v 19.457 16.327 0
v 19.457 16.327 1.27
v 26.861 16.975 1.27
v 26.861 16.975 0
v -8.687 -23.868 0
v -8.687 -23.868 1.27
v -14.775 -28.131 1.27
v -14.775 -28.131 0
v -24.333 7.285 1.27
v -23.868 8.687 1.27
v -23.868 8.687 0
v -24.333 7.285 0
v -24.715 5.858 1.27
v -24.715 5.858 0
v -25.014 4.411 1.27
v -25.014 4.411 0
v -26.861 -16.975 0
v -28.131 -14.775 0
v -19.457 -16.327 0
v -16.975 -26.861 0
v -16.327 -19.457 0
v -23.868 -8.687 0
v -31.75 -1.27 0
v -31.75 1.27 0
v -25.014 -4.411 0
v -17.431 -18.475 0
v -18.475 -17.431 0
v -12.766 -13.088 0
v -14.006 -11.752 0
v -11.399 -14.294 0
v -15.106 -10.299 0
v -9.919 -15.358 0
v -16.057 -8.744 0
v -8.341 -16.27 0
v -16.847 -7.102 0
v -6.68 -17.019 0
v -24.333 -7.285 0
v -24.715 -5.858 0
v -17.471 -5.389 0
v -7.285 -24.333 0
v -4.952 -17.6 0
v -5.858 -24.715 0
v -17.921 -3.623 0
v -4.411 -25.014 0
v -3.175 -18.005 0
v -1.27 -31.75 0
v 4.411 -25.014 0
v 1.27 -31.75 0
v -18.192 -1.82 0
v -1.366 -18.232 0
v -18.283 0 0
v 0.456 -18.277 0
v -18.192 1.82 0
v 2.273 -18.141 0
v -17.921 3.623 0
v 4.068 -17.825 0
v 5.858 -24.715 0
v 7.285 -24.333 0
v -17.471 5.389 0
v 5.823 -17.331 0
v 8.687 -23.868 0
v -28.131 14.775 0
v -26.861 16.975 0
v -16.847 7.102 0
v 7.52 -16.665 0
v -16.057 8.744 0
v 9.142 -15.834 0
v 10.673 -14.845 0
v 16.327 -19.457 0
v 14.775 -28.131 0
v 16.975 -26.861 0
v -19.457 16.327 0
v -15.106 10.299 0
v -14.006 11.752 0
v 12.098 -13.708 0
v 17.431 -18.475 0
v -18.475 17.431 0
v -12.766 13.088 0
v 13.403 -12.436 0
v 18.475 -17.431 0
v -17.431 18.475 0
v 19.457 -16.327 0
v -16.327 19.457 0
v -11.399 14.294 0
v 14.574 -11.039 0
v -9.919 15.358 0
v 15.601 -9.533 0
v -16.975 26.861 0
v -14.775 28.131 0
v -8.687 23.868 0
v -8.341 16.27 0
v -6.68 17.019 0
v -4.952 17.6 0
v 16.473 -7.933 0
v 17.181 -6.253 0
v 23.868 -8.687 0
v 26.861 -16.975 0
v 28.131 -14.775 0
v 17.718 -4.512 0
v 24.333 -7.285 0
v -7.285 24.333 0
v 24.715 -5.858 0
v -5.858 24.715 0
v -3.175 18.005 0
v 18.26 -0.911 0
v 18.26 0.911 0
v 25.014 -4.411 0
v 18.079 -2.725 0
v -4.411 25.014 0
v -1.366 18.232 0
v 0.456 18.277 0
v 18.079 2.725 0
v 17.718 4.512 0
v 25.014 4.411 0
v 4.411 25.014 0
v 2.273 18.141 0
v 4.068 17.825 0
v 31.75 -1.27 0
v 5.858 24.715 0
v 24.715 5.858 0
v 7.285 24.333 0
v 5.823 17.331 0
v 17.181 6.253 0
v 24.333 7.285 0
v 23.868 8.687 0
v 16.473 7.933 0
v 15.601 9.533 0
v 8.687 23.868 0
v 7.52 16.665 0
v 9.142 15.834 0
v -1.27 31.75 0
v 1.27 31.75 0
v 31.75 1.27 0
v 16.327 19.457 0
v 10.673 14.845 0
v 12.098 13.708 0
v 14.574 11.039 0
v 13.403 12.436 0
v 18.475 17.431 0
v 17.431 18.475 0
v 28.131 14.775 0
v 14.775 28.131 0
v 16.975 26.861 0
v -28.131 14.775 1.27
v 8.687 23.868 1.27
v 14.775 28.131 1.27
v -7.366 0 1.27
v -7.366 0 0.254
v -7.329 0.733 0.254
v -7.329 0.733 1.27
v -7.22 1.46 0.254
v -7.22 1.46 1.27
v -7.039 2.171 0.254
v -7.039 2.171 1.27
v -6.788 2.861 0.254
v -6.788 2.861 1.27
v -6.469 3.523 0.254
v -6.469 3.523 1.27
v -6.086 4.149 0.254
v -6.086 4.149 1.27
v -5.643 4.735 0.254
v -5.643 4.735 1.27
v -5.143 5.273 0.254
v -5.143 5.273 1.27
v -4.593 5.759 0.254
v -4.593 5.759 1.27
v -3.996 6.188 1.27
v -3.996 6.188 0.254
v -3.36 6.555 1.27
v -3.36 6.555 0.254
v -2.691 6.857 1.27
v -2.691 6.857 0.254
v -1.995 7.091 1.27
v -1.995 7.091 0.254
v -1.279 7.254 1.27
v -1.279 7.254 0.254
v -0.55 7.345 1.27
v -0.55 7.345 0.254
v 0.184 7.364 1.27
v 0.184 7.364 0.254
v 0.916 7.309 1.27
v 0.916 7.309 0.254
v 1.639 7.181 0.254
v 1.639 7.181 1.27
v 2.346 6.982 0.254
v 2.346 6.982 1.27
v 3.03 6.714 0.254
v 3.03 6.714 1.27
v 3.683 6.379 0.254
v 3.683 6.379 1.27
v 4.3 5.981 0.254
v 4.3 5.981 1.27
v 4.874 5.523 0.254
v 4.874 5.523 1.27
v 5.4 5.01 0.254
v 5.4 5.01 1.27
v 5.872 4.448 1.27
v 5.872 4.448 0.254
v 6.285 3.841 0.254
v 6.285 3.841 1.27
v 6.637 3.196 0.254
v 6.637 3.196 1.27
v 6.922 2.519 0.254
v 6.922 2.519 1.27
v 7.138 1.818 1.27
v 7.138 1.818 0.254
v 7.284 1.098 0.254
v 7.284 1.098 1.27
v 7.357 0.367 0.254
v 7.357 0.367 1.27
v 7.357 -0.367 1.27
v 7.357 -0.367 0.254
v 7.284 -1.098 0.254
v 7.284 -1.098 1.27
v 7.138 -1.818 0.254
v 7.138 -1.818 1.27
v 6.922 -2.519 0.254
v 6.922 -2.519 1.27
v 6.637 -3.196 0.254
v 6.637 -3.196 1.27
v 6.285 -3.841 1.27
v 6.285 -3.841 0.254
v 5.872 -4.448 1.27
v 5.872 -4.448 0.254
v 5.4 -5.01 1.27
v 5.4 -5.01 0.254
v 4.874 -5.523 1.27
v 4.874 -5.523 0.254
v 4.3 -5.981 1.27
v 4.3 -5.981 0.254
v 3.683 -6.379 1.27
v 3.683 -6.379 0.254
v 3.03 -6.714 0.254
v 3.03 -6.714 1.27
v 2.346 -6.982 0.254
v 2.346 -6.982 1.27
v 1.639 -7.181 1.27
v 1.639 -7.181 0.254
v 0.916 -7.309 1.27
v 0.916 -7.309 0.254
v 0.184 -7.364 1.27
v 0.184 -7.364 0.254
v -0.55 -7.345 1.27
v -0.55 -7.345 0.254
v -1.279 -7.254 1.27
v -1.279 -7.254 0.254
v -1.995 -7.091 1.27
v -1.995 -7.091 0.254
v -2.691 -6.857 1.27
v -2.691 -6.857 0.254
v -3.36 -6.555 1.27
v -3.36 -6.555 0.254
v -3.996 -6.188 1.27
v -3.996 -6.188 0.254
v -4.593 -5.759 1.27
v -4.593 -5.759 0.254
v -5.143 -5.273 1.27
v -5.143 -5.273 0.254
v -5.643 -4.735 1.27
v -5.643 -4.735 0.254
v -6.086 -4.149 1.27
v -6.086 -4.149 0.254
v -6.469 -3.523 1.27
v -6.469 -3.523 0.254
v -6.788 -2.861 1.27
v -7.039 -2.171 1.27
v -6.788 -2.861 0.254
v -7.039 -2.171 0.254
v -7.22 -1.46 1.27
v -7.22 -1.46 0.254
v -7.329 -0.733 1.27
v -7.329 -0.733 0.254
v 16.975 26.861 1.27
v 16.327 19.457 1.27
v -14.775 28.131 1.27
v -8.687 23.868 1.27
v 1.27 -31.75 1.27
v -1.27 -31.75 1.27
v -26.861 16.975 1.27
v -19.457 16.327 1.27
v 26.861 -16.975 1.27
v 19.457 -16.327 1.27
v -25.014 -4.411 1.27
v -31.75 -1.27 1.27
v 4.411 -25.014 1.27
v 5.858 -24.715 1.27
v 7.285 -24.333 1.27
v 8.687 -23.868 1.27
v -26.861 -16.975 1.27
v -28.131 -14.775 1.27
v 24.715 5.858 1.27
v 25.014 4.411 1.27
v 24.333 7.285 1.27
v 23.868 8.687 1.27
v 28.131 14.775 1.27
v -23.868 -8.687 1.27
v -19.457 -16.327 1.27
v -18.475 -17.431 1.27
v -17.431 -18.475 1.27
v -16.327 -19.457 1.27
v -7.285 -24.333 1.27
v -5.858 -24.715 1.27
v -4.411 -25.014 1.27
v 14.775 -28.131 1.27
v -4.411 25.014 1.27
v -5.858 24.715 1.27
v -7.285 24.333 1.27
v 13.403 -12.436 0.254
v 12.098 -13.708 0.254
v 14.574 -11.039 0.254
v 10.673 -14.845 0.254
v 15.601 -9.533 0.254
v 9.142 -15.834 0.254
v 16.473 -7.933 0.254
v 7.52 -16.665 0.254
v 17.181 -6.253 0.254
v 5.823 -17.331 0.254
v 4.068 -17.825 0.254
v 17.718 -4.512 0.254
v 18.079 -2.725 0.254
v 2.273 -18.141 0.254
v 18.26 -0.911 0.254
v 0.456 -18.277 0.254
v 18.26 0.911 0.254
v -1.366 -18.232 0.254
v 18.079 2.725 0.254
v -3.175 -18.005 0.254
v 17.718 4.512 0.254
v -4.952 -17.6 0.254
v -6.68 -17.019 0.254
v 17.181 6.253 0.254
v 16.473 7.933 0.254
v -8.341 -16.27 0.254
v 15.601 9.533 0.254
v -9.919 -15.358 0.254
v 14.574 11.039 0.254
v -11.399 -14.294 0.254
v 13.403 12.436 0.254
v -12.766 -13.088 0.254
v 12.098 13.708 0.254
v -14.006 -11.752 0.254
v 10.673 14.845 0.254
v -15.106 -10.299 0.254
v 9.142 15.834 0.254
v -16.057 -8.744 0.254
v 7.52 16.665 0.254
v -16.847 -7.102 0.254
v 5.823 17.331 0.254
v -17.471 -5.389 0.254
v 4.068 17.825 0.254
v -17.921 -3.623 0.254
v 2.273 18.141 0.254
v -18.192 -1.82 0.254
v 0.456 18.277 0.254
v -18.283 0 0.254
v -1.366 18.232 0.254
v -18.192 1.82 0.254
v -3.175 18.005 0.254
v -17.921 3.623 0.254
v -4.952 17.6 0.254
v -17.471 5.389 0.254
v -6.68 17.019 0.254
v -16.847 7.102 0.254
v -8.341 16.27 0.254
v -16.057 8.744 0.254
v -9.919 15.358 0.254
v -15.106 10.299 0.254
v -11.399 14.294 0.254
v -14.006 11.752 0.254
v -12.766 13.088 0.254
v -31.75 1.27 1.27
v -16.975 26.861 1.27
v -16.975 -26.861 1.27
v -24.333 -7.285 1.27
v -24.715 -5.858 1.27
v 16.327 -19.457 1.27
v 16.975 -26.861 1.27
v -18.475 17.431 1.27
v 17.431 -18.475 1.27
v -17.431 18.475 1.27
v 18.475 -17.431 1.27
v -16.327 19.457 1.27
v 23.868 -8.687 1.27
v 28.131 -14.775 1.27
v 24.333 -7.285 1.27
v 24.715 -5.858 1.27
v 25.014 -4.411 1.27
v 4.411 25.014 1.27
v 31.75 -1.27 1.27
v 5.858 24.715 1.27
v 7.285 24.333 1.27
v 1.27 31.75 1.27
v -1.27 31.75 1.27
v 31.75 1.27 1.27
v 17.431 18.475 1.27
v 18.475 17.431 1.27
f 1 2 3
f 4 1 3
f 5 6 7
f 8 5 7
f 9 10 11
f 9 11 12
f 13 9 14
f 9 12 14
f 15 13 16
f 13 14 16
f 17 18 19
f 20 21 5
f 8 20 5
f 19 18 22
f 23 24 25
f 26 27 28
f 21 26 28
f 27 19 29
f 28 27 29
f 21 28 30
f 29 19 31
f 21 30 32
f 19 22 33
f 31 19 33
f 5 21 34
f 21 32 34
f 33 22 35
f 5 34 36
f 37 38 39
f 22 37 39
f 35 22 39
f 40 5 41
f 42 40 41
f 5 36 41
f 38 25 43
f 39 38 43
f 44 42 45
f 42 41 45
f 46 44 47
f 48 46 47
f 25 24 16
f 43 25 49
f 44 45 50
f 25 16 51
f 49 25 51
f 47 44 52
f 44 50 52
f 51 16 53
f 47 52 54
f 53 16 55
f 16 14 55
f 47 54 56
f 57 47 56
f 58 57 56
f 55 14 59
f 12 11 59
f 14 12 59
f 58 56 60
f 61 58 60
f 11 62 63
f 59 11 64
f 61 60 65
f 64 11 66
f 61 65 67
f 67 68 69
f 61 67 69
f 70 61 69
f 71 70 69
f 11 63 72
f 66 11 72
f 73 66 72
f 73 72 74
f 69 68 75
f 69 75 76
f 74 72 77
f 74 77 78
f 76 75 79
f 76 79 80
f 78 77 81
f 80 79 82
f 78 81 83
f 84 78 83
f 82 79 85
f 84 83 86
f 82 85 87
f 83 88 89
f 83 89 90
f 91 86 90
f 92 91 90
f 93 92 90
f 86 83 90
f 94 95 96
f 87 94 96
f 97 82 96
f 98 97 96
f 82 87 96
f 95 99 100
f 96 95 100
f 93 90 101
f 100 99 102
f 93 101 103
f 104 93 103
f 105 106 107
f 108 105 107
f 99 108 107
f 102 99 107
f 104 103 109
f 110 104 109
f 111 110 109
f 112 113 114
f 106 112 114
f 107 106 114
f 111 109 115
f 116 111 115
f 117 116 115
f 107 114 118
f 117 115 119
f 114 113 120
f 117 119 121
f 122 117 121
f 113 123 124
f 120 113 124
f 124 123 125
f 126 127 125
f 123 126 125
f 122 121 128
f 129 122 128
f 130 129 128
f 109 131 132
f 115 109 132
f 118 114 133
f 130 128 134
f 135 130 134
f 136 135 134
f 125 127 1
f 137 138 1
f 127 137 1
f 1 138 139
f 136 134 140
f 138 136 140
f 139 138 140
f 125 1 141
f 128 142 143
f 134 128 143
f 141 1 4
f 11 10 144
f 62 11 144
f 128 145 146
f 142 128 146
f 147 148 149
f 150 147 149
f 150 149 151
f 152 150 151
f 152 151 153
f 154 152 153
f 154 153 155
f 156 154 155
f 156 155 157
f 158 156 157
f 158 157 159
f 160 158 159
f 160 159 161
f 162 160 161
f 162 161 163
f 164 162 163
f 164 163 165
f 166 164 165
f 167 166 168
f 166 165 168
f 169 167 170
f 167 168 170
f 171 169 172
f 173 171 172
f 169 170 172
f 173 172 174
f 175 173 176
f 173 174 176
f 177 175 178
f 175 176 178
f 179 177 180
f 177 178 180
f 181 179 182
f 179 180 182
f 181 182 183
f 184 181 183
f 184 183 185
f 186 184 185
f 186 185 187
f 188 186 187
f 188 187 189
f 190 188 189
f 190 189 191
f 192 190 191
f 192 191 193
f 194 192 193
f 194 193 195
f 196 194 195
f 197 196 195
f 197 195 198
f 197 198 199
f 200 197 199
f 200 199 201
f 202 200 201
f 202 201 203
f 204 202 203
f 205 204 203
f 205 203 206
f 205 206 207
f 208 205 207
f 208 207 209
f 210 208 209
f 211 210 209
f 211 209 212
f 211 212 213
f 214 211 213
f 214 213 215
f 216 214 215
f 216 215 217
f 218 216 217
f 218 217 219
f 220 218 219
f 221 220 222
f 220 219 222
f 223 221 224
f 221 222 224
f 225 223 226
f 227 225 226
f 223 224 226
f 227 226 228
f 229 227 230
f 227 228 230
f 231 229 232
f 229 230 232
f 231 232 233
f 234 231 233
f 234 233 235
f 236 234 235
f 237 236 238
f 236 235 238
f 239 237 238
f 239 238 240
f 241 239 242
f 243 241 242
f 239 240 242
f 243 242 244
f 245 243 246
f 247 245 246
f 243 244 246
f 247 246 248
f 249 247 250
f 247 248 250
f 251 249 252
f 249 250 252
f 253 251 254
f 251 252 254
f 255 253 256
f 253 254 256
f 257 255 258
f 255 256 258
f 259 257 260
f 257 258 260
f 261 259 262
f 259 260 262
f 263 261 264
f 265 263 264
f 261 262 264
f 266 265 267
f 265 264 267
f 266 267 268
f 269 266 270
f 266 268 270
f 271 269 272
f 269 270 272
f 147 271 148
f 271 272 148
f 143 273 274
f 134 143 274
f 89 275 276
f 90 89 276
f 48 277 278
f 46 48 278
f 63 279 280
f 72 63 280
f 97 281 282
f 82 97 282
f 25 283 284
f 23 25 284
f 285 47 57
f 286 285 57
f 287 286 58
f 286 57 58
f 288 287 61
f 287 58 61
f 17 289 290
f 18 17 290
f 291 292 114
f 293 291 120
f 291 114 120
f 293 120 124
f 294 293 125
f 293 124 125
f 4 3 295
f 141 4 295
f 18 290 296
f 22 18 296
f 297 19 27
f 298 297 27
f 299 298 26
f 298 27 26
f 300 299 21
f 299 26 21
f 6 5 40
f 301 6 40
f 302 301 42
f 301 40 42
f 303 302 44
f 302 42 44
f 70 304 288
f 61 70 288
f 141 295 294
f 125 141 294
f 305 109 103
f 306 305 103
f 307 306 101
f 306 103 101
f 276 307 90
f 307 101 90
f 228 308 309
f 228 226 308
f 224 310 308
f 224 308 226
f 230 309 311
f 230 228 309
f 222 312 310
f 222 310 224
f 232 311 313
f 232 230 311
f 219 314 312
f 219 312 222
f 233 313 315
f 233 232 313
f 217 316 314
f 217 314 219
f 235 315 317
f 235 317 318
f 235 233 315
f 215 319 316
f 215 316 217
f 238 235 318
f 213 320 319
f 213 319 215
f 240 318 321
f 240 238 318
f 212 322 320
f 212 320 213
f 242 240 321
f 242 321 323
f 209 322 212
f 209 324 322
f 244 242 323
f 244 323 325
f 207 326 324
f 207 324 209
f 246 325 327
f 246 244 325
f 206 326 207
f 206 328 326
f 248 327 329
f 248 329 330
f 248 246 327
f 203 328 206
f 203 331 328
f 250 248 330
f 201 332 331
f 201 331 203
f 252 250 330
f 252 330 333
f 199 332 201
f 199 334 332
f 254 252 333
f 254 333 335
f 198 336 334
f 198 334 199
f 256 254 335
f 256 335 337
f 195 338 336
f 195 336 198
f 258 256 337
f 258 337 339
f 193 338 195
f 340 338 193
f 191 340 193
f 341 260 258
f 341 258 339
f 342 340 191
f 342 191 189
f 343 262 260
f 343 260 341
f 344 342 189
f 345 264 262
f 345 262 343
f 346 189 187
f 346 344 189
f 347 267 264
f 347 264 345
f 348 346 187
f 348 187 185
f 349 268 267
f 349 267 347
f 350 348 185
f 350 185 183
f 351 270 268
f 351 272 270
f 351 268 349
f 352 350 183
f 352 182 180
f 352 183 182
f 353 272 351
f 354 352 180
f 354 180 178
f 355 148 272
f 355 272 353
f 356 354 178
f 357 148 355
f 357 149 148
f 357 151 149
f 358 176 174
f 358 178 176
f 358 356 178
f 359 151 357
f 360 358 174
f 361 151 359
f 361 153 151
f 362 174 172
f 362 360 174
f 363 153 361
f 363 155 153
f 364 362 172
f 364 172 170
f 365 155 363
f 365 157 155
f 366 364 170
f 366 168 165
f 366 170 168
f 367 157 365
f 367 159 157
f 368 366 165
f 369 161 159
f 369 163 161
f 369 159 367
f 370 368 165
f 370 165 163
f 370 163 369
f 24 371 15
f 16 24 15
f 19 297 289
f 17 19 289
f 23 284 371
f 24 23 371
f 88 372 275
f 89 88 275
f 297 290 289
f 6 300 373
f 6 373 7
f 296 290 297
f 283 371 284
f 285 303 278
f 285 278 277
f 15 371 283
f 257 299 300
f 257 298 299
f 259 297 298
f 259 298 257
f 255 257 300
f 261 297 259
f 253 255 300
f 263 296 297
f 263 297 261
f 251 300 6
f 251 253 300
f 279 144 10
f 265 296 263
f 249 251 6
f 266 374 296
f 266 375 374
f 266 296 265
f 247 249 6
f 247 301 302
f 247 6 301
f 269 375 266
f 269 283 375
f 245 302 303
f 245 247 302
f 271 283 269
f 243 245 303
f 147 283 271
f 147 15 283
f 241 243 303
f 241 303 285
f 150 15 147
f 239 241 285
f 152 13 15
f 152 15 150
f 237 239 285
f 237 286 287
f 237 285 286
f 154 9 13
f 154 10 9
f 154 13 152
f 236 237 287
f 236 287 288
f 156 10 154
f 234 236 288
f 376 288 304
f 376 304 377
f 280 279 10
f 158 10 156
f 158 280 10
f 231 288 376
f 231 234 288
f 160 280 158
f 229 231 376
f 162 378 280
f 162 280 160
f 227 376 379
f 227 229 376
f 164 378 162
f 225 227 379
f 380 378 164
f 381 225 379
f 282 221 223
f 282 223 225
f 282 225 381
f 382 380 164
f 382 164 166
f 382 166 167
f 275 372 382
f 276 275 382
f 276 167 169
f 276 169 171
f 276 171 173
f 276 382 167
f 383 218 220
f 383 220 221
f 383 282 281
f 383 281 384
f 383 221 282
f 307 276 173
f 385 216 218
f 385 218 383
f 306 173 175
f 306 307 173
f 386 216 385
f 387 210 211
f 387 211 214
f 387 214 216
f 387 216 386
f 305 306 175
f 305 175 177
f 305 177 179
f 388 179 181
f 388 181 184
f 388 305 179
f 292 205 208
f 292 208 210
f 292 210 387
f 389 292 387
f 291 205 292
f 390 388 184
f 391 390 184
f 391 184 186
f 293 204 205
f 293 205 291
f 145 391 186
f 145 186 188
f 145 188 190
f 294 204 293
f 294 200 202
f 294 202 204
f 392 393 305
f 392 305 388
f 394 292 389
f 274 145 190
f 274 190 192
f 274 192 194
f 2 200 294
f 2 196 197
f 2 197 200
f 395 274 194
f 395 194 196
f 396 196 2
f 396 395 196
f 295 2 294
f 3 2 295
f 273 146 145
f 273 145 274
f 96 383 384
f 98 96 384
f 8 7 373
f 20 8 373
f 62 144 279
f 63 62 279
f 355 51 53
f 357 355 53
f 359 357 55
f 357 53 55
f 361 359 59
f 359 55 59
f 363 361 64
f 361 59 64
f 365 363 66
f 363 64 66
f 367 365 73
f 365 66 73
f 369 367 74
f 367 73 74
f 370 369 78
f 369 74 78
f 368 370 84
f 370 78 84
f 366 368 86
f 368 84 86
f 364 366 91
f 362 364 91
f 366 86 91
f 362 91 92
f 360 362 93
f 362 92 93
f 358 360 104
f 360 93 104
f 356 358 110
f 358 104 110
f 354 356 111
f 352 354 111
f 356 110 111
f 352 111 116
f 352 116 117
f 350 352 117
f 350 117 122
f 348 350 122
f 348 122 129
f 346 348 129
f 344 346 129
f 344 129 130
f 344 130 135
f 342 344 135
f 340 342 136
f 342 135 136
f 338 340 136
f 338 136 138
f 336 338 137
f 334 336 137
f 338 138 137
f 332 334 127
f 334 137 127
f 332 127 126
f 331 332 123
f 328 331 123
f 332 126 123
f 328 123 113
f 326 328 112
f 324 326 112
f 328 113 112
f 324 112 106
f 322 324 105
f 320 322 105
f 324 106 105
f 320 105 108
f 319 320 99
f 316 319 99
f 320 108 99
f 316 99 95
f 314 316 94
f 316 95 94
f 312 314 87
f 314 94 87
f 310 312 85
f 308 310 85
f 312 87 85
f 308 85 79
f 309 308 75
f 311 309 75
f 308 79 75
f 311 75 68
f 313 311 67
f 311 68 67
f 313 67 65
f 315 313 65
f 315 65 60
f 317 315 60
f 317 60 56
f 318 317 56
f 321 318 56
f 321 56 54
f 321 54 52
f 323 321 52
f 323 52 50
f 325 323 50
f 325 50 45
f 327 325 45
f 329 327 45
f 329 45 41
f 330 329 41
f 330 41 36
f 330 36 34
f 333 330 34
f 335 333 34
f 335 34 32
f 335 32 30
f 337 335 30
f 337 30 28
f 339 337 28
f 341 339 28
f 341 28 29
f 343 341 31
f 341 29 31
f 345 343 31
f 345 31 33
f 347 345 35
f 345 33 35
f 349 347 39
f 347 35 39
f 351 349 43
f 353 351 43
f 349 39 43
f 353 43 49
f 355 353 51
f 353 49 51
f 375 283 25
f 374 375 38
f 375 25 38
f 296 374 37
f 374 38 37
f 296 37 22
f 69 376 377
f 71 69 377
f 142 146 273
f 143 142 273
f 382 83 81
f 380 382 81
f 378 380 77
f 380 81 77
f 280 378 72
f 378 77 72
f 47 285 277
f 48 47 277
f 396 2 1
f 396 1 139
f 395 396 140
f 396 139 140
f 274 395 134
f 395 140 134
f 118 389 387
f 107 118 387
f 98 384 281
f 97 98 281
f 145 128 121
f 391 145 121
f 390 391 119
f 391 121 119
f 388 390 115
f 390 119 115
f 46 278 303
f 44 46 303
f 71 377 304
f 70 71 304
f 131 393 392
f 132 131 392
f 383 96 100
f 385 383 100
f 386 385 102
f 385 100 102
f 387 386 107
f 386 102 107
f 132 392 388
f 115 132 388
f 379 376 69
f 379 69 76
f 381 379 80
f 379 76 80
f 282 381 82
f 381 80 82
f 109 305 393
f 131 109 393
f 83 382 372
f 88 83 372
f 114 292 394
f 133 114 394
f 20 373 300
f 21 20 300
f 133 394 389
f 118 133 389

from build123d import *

# Parameters (mm, degrees)
SKETCH1_R           = 25.4
BOSS_EXTRUDE1_DEPTH = 1.27
BOSS_EXTRUDE2_DEPTH = 1.27
SKETCH3_R           = 7.366
CUT_EXTRUDE1_DEPTH  = 10
CIRPATTERN1_COUNT   = 12
SKETCH4_R           = 18.283160809
CUT_EXTRUDE2_DEPTH  = 0.254


with BuildPart() as part:
    # Sketch1 → Boss-Extrude1 (new body)
    with BuildSketch(Plane.XY):
        Circle(SKETCH1_R)
    extrude(amount=BOSS_EXTRUDE1_DEPTH)

    # Sketch2 → Boss-Extrude2 (add)
    with BuildSketch(Plane.XY.offset(1.27)):
        with BuildLine():
            Line((-1.27, 31.75), (1.27, 31.75))
            Line((1.27, 31.75), (4.411023441, 25.014053494))
            ThreePointArc((4.411023441, 25.014053494), (0, 25.4), (-4.411023441, 25.014053494))
            Line((-4.411023441, 25.014053494), (-1.27, 31.75))
        make_face()
    boss_extrude2 = extrude(amount=-BOSS_EXTRUDE2_DEPTH)

    # Sketch3 → Cut-Extrude1 (cut)
    with BuildSketch(Plane(origin=(0, 0, 0), x_dir=(-1, 0, 0), z_dir=(0, 0, -1))):
        Circle(SKETCH3_R)
    extrude(amount=-CUT_EXTRUDE1_DEPTH, mode=Mode.SUBTRACT)

    # CirPattern1: Boss-Extrude2 ×12 about axis
    cirpattern1_axis = Axis((0, 0, 0), (0, 0, 1))
    for i in range(1, CIRPATTERN1_COUNT):
        add(boss_extrude2.rotate(cirpattern1_axis, i * 360 / CIRPATTERN1_COUNT))

    # Sketch4 → Cut-Extrude2 (cut)
    with BuildSketch(Plane(origin=(0, 0, 0), x_dir=(-1, 0, 0), z_dir=(0, 0, -1))):
        Circle(SKETCH4_R)
    extrude(amount=-CUT_EXTRUDE2_DEPTH, mode=Mode.SUBTRACT)


solid = part.part
